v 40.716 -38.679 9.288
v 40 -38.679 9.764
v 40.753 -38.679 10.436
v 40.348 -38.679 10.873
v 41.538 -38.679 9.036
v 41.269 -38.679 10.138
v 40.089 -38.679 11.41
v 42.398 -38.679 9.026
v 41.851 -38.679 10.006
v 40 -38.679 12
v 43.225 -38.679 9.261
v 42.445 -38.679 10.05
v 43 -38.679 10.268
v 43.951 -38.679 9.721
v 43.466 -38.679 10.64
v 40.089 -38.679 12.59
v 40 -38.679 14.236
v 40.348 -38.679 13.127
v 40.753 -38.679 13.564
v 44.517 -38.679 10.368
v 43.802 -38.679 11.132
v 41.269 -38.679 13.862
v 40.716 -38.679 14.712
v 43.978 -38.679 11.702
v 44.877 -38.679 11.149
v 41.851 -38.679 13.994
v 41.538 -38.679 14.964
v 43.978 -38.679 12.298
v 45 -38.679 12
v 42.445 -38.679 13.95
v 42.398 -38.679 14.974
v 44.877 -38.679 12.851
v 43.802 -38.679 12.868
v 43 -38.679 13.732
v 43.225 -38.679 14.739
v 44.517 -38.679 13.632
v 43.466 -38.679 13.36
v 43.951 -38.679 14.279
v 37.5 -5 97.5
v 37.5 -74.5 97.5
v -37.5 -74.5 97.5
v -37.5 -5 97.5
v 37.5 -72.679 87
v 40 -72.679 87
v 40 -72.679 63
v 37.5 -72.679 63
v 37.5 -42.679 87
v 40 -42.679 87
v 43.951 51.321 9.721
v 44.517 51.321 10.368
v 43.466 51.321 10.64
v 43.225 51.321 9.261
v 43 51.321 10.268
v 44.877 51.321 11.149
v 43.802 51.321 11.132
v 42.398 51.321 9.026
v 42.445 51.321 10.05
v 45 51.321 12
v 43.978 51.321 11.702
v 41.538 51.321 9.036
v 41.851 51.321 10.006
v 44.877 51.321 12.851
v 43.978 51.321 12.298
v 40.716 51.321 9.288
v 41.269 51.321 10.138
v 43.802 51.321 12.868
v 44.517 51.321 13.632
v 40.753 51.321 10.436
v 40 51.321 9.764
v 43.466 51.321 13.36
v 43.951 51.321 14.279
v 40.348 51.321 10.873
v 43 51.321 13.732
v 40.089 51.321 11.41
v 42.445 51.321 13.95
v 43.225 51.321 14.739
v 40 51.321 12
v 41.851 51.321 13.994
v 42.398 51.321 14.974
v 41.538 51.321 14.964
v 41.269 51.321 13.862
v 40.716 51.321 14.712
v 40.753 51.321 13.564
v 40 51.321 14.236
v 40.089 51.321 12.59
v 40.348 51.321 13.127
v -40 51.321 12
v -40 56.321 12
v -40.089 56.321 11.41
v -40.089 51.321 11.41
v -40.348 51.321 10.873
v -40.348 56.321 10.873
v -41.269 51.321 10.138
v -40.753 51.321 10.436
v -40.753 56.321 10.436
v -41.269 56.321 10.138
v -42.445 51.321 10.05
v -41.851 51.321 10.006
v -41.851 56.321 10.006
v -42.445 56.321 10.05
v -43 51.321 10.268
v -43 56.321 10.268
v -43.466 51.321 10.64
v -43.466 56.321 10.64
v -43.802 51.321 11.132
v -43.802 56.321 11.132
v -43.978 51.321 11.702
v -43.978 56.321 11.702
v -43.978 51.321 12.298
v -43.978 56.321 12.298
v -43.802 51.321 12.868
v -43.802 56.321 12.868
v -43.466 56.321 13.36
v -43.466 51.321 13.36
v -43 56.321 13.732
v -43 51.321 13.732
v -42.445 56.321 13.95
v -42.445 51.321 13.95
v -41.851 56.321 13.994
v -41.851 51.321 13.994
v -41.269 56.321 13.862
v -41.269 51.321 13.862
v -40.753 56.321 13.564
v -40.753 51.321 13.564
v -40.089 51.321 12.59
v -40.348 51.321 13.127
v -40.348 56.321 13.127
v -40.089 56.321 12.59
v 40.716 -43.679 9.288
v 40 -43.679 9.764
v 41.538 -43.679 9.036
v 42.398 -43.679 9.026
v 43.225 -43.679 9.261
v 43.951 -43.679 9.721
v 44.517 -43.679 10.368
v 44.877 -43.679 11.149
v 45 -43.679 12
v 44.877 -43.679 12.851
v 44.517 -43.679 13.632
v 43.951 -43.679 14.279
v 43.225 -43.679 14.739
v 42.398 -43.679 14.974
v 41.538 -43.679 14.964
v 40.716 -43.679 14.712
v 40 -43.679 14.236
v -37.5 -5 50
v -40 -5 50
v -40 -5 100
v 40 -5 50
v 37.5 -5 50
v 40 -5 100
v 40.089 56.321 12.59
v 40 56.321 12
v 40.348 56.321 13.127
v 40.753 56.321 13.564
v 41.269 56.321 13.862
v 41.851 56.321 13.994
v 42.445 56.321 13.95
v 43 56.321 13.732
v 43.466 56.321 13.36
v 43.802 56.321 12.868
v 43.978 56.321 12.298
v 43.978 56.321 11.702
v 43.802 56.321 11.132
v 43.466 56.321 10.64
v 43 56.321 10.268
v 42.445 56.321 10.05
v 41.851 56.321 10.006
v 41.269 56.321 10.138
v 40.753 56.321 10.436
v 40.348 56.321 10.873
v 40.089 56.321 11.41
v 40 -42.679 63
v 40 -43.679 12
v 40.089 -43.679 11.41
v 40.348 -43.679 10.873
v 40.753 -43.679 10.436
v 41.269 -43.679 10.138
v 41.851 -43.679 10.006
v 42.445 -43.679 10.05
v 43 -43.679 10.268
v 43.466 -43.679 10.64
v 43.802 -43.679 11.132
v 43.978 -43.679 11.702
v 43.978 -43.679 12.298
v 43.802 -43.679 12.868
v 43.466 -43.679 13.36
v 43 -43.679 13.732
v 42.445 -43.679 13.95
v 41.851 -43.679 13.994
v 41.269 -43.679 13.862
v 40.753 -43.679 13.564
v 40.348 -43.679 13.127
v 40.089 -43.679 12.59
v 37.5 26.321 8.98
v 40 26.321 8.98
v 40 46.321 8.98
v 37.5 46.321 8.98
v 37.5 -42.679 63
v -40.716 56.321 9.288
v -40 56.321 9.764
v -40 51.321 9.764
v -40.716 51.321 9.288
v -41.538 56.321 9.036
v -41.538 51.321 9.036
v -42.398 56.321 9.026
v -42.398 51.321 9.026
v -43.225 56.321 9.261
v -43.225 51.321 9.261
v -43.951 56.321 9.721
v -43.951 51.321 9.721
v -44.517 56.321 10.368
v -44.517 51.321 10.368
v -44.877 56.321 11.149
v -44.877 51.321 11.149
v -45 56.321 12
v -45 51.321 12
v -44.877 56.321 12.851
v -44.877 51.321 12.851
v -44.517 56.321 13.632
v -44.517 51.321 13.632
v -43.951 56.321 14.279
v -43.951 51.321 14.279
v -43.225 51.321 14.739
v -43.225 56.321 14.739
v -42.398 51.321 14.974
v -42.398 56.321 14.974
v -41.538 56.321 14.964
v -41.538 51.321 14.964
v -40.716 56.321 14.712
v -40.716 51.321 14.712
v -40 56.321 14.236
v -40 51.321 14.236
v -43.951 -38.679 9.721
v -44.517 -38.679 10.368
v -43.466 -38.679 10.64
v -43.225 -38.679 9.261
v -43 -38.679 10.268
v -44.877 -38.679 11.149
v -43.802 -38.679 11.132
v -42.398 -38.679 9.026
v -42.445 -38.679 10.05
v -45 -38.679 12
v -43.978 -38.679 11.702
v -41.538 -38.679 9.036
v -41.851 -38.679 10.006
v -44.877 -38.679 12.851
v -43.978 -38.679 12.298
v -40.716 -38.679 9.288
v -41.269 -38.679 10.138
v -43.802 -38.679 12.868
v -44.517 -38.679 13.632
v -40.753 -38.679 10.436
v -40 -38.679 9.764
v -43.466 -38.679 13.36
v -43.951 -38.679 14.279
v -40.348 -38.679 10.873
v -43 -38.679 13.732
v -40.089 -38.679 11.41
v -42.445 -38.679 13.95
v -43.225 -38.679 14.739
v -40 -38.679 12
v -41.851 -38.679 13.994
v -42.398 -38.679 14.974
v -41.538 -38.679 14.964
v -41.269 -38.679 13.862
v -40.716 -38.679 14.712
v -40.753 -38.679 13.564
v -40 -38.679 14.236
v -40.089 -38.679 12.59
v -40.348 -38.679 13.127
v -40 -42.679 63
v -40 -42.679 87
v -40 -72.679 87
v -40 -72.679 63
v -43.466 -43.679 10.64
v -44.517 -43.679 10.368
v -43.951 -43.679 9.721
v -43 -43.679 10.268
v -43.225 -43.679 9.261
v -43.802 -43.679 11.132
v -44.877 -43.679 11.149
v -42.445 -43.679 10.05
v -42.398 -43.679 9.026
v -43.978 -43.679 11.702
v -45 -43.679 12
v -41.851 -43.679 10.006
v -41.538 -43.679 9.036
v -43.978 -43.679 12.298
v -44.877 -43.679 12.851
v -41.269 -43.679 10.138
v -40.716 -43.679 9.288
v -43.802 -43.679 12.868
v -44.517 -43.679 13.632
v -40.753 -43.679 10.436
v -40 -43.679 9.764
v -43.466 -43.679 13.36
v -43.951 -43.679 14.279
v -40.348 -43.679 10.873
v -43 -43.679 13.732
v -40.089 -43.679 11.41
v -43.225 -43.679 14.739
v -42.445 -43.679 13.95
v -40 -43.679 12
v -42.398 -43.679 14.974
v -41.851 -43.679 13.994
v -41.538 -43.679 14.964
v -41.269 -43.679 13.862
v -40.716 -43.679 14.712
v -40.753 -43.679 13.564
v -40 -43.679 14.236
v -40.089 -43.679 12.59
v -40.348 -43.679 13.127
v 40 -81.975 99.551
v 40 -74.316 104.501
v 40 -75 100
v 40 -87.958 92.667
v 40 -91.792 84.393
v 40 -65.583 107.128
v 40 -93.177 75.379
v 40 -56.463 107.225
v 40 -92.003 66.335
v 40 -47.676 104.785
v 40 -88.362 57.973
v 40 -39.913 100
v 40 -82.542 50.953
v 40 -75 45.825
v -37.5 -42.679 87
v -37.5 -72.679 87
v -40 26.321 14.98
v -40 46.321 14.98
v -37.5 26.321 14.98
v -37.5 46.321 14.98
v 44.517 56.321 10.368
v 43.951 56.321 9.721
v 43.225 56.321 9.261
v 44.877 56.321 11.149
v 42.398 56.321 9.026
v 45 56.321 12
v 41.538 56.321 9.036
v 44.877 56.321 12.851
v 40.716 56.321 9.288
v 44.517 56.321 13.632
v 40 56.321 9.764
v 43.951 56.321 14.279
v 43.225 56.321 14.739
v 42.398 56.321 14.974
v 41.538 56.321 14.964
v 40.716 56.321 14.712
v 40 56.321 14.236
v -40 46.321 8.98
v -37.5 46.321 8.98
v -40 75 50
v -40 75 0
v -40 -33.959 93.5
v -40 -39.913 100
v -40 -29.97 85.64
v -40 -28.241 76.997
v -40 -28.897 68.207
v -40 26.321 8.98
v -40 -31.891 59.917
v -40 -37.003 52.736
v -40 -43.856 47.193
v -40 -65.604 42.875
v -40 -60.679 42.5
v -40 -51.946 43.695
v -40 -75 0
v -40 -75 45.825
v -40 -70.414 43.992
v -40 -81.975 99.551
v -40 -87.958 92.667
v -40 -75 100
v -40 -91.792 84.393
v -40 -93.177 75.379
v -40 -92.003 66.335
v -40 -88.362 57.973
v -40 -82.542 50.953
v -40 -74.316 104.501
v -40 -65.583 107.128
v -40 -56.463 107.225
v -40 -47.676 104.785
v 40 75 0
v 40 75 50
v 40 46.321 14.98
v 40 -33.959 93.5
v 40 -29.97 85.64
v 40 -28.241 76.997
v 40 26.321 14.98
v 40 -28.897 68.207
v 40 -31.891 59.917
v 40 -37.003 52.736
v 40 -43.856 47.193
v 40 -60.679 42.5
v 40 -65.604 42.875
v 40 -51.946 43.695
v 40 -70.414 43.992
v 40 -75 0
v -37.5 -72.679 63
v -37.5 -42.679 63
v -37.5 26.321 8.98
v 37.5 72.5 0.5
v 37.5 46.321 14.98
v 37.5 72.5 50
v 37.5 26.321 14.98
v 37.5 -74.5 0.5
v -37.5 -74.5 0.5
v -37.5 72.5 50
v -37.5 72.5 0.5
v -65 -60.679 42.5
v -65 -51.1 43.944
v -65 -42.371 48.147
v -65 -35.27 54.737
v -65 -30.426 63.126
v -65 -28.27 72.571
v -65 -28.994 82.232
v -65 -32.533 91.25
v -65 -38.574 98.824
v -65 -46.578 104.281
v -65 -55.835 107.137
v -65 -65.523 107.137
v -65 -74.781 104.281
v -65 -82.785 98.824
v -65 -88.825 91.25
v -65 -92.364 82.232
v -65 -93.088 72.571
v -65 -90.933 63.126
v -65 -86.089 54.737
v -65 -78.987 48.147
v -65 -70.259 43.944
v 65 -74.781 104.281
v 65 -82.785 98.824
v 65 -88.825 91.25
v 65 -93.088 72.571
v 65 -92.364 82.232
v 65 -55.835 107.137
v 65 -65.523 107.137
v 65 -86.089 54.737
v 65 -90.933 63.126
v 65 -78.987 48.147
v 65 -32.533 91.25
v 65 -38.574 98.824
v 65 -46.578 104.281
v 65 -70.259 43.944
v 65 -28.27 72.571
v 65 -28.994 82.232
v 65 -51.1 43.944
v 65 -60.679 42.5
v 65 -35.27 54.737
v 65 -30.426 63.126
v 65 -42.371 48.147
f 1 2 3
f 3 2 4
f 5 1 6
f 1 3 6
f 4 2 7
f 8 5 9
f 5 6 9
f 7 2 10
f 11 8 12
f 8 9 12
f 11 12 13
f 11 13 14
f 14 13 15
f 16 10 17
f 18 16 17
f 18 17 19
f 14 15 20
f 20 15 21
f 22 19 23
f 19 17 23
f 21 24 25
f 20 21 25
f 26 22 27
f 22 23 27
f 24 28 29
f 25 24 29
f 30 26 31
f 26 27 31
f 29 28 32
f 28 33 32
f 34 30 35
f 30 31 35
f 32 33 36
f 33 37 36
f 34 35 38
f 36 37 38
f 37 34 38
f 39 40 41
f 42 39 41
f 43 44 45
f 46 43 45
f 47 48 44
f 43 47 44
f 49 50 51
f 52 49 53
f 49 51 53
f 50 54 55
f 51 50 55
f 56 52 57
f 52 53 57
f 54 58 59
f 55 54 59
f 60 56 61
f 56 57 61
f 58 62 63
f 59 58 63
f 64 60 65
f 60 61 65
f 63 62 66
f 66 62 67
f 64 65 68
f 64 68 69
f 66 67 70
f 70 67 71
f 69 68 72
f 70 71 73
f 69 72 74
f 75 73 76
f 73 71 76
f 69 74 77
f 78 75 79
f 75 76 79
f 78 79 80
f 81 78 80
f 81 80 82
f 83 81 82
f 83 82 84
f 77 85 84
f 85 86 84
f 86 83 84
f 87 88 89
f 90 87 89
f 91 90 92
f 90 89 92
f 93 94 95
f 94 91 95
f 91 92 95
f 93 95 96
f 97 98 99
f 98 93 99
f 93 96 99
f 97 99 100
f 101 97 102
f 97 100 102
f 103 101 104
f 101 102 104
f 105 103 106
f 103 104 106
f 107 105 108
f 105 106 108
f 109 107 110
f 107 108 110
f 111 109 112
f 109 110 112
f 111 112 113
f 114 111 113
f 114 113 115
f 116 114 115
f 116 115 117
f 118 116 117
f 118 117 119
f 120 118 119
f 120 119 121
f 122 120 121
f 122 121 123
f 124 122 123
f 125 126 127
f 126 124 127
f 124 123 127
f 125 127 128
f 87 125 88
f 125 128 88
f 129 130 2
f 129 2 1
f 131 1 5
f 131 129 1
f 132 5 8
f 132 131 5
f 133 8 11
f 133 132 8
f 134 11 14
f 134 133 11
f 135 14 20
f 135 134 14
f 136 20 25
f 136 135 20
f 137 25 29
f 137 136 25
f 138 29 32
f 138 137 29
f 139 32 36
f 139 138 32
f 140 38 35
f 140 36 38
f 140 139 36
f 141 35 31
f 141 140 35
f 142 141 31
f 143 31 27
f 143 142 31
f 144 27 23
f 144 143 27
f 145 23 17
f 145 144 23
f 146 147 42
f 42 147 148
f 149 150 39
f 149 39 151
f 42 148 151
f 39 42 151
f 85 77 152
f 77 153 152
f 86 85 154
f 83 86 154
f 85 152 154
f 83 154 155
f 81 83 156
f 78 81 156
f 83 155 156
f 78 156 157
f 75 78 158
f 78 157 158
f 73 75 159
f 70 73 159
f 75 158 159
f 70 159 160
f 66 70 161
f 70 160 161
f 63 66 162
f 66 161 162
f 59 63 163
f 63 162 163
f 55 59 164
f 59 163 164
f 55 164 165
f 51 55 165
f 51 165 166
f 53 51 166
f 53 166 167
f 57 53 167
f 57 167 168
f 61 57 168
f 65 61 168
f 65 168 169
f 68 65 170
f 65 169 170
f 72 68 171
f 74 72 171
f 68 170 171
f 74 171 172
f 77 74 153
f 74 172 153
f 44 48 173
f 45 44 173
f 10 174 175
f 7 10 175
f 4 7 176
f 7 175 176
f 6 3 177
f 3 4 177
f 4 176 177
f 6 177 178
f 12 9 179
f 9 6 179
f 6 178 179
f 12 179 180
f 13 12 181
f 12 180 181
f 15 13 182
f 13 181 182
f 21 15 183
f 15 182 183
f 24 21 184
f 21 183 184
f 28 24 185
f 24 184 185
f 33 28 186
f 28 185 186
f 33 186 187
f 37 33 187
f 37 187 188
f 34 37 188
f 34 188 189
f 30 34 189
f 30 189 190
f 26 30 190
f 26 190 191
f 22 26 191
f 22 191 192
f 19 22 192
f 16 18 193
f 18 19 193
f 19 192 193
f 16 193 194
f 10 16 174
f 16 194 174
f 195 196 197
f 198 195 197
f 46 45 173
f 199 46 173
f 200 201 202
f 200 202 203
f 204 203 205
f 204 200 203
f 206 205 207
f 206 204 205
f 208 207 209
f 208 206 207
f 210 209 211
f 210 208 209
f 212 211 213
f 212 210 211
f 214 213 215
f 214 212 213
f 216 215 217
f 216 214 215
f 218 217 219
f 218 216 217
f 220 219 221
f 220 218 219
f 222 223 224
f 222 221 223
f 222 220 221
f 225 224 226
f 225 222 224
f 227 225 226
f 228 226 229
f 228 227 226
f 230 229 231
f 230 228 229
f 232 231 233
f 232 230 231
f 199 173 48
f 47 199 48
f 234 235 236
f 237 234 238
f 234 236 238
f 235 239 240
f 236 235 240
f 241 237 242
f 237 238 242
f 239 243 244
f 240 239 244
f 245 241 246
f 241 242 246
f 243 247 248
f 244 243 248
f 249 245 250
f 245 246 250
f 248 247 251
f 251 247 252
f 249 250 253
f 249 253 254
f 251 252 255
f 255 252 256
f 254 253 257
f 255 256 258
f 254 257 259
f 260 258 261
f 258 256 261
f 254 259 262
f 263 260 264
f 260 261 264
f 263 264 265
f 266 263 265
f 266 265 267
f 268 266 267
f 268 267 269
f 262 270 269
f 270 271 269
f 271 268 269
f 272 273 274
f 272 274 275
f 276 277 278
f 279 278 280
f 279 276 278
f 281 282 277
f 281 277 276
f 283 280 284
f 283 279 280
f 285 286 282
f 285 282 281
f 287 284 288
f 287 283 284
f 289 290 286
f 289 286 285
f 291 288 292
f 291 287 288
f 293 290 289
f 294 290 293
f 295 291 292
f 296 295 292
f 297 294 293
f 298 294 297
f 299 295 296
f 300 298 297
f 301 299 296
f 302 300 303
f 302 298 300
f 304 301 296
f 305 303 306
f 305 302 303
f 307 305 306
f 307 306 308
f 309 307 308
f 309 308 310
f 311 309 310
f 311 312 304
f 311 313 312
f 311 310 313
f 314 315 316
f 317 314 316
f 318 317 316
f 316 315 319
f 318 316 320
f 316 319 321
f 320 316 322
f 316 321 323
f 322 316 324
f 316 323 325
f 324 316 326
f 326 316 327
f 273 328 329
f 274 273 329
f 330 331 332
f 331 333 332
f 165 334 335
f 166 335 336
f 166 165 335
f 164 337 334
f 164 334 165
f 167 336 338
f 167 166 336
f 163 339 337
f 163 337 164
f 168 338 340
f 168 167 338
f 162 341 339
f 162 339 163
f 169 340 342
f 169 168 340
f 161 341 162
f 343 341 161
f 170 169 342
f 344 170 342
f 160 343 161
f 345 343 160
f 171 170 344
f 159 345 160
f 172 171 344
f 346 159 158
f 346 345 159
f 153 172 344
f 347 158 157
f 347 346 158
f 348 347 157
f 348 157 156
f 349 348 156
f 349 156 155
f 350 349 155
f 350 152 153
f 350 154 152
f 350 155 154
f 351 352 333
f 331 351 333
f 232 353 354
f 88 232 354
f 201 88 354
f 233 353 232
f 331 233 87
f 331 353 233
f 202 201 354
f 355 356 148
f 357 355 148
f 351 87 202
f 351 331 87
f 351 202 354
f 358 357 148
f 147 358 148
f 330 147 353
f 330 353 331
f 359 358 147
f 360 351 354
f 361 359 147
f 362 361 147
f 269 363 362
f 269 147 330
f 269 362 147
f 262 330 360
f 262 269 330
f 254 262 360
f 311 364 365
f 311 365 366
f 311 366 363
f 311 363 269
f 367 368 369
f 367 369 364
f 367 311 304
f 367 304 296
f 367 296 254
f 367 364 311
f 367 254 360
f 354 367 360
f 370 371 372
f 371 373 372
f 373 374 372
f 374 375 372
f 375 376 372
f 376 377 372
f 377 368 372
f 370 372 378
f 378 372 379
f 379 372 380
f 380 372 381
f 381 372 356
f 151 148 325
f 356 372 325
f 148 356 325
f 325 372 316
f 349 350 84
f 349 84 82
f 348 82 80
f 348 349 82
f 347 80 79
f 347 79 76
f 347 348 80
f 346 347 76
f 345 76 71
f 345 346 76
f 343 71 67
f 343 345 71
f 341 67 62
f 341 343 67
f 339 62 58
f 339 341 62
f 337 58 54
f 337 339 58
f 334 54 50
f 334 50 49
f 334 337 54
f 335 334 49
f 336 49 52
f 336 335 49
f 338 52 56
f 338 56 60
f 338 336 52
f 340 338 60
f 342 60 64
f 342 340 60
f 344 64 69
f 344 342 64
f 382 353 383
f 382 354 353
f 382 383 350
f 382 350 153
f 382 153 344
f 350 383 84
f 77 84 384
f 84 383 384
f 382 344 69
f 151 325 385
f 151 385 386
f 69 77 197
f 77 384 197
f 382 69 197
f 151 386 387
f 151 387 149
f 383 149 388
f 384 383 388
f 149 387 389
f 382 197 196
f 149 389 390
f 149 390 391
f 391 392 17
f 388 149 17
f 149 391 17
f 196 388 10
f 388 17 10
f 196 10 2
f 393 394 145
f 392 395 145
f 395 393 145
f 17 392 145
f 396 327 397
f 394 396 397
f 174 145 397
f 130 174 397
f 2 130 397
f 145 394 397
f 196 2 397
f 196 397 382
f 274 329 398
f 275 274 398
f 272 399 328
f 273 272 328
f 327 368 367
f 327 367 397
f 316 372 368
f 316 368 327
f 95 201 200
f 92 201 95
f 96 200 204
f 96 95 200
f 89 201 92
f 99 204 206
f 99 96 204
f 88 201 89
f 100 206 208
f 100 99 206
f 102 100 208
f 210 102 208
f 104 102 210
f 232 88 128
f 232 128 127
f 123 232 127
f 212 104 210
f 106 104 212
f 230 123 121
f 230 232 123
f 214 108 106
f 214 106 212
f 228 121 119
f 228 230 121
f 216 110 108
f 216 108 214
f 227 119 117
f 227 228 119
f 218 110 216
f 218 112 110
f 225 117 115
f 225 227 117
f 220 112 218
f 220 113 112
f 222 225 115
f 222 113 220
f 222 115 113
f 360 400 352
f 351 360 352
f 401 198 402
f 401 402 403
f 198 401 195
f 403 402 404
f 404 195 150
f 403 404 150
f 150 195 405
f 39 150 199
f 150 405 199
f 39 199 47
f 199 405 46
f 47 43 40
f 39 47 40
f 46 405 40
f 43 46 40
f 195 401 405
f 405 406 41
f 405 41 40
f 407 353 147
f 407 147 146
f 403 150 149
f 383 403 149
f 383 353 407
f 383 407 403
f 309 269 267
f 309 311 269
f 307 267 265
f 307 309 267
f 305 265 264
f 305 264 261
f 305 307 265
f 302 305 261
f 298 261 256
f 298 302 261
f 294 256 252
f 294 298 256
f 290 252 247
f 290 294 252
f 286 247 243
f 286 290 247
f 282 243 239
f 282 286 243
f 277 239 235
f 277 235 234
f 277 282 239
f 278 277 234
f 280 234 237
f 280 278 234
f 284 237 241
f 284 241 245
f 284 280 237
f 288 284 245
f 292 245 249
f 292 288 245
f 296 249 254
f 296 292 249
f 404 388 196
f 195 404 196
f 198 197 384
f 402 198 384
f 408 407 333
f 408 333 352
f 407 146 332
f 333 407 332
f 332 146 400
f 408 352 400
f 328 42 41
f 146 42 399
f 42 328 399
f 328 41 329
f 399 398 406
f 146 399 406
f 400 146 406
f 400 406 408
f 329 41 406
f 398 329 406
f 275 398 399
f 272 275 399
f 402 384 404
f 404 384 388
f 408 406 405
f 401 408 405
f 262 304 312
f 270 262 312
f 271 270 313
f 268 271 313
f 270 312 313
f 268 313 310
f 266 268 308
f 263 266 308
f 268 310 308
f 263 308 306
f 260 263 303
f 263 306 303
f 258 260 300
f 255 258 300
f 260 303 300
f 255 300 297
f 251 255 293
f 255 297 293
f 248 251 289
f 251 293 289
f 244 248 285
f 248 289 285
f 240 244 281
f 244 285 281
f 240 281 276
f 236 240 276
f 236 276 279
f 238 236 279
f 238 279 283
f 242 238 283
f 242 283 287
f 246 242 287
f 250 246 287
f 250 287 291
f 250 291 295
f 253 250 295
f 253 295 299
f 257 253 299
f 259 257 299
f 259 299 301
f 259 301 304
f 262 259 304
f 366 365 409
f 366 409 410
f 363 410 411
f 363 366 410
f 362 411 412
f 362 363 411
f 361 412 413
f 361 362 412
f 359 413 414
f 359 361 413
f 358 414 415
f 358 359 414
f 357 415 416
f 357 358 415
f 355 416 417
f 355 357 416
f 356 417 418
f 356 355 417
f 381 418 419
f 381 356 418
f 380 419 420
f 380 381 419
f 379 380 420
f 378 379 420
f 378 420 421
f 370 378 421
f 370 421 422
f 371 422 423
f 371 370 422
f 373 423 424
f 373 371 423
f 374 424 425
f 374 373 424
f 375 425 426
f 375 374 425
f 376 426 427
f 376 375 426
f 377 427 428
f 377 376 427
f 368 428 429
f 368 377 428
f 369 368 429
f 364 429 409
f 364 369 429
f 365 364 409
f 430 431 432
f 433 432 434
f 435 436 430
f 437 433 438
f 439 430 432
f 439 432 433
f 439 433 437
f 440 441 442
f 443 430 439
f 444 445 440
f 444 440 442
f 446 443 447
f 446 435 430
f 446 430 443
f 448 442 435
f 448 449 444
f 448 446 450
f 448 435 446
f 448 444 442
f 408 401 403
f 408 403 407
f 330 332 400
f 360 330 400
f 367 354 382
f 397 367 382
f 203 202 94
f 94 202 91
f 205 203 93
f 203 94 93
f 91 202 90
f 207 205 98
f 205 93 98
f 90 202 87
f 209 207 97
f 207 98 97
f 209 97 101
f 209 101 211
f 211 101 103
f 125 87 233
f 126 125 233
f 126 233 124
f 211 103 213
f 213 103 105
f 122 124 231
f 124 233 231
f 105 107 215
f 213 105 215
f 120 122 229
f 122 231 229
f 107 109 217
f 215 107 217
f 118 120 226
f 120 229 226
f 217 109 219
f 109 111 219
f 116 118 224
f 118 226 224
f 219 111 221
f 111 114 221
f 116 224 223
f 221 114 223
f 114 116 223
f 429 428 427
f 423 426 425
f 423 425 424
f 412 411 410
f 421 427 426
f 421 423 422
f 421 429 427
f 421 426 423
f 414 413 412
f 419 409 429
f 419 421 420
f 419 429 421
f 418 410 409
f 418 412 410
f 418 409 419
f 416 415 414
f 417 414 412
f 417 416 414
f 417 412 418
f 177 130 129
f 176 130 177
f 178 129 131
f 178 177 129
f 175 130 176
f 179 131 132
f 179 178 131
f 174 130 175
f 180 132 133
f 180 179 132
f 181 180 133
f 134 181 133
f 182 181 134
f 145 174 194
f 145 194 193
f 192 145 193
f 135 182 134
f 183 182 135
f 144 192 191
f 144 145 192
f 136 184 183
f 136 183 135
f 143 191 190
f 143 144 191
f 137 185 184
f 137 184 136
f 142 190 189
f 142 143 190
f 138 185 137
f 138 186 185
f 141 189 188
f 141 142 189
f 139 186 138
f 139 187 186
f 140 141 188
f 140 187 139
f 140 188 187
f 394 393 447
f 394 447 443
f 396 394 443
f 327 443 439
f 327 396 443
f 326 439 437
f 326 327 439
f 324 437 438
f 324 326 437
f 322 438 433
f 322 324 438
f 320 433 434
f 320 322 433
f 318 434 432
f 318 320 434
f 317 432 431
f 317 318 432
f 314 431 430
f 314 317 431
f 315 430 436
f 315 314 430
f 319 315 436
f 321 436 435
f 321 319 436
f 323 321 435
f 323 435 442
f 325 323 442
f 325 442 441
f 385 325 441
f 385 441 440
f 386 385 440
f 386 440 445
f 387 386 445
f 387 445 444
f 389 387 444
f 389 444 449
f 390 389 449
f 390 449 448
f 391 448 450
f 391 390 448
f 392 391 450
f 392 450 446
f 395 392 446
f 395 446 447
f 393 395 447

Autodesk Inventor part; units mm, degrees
ref_plane "YZ Plane" through (0, 0, 0) normal (1, 0, 0) x (0, 1, 0)
ref_plane "XZ Plane" through (0, 0, 0) normal (0, 1, 0) x (-1, 0, 0)
ref_plane "XY Plane" through (0, 0, 0) normal (0, 0, 1) x (1, 0, 0)
sketch "Boceto1" plane through (0, 0, 0) normal (0, 0, 1) x (1, 0, 0)
  line L0 (-40, 75) -> (40, 75)
  line L1 (40, 75) -> (40, -75)
  line L2 (40, -75) -> (-40, -75)
  line L3 (-40, -75) -> (-40, 75)
  line L4 (-40, 75) -> (40, -75) construction
  line L5 (40, 75) -> (-40, -75) construction
  line L6 (37.5, 72.5) -> (-37.5, 72.5)
  line L7 (-37.5, 72.5) -> (-37.5, -74.5)
  line L8 (-37.5, -74.5) -> (37.5, -74.5)
  line L9 (37.5, -74.5) -> (37.5, 72.5)
  point P0 (0, 0)
  dimension "d0" = 80
  dimension "d1" = 150
  dimension "d2" = 2.5
  dimension "d32" = 0.5
extrude "Extrusión1" add sketch "Boceto1" along normal blind 50
extrude "Extrusión2" add sketch "Boceto1" along normal blind 0.5 contours L9 L8 L7 L6
sketch "Boceto2" plane through (40, -75, 0) normal (1, 0, 0) x (0, 0, -1)
  circle A0 centre (-75, 14.3207) radius 32.5
  line L0 (-106.2586, 14.1414) -> (-42.2586, 14.1414) construction
  line L1 (0, 0) -> (-50, 0) projected
  line L2 (-87, 2.3207) -> (-63, 2.3207)
  line L3 (-63, 2.3207) -> (-63, 32.3207)
  line L4 (-63, 32.3207) -> (-87, 32.3207)
  line L5 (-87, 32.3207) -> (-87, 2.3207)
  line L6 (-0.5, 0.5) -> (-50, 0.5) projected
  line L7 (0, 150) -> (0, 0) projected
  line L8 (-49.75, 14.1414) -> (25.25, 14.1414) construction
  point P0 (0, 75)
  dimension "d9" = 65
  dimension "d15" = 24
  dimension "d16" = 30
extrude "Extrusión3" cut sketch "Boceto2" against normal blind 10 contours L5 L4 L3 L2
extrude "Extrusión4" add sketch "Boceto2" along normal blind 25 contours A0 | L5 L4 L3 L2
mirror "Simetría1" about plane through (0, 0, 0) normal (1, 0, 0) of "Extrusión4", "Extrusión3"
sketch "Boceto3" plane through (40, -75, 0) normal (0, -1, 0) x (1, 0, 0)
  line L0 (-80, 0) -> (-80, 50) projected
  line L1 (-2.5, 0.5) -> (-2.5, 50) projected
  line L2 (-80, 107.5) -> (-80, 45.8252) projected
  line L3 (-80, 50) -> (-80, 100)
  line L4 (-80, 100) -> (0, 100)
  line L5 (0, 0) -> (0, 50) projected
  line L6 (0, 100) -> (0, 50)
  line L7 (0, 50) -> (-2.5, 50)
  line L8 (-2.5, 50) -> (-2.5, 97.5)
  line L9 (-2.5, 97.5) -> (-77.5, 97.5)
  line L10 (-77.5, 97.5) -> (-77.5, 50)
  line L11 (-77.5, 50) -> (-80, 50)
  line L12 (-77.5, 50) -> (-2.5, 50) projected
  line L13 (-77.5, 50) -> (-2.5, 50)
  point P0 (-40, 0)
  dimension "d24" = 50
  dimension "d25" = 80
  dimension "d26" = 47.5
  dimension "d27" = 75
extrude "Extrusión5" add sketch "Boceto3" against normal blind 70 contours L4 L6 L7 L8 L9 L10 L11 L2
extrude "Extrusión6" add sketch "Boceto3" against normal blind 0.5 contours L10 L9 L8 L12
extrude "Extrusión7" cut sketch "Boceto2" against normal blind 80 contours L5 L4 L3 L2
ref_plane "Plano de trabajo1" through (-40, -93.1793, 75) normal (0, -1, 0) x (1, 0, 0)
sketch "Boceto4" plane through (40, -75, 0) normal (1, 0, 0) x (0, 0, -1)
  line L0 (0, 0) -> (0, 150) projected
  line L1 (21.5, -18.1793) -> (-129, -18.1793) projected
  line L2 (-12, 31.3207) -> (-12, 131.3207) construction
  line L3 (-21.5167, 81.3207) -> (7.9238, 81.3207)
  line L4 (-0.5, 147.5) -> (-0.5, 0.5) projected
  line L5 (-8, 131.3207) -> (-8, 121.3207)
  line L6 (-8.9804, 121.3207) -> (-14.9804, 121.3207)
  line L7 (-14.9804, 121.3207) -> (-14.9804, 101.3207)
  line L8 (-14.9804, 101.3207) -> (-8.9804, 101.3207)
  line L9 (-8.9804, 101.3207) -> (-8.9804, 121.3207)
  line L10 (-11, 101.3207) -> (-11, 103.5079)
  point P0 (0, 75)
  dimension "d39" = 100
  dimension "d45" = 24
  dimension "d46" = 10
  dimension "d47" = 8
  dimension "d49" = 20
  dimension "d53" = 6
ref_plane "Plano de trabajo2" through (40, 56.3207, 12) normal (0, 1, 0) x (-1, 0, 0)
sketch "Boceto5" plane through (40, 56.3207, 12) normal (0, 1, 0) x (-1, 0, 0)
  line L0 (0, 0) -> (-2, 0)
  circle A0 centre (-2, 0) radius 2
  arc A1 (0, 2.2361) -> (0, -2.2361) centre (-2, 0) ccw
  line L1 (0, -2.2361) -> (0, 2.2361)
  point P0 (40, -12)
  dimension "d40" = 2
  dimension "d41" = 6
extrude "Extrusión8" add sketch "Boceto5" against normal blind 5
ref_plane "Plano de trabajo3" through (40, 6.3207, 21.5167) normal (0, -1, 0) x (0, 0, -1)
mirror "Simetría2" about plane through (40, 6.3207, 21.5167) normal (0, -1, 0) of "Extrusión8"
extrude "Extrusión9" cut sketch "Boceto4" against normal through all
ref_plane "Plano de trabajo4" through (0, -75, 0) normal (1, 0, 0) x (0, 0, -1)
mirror "Simetría3" about plane through (0, -75, 0) normal (1, 0, 0) of "Extrusión8", "Simetría2"
